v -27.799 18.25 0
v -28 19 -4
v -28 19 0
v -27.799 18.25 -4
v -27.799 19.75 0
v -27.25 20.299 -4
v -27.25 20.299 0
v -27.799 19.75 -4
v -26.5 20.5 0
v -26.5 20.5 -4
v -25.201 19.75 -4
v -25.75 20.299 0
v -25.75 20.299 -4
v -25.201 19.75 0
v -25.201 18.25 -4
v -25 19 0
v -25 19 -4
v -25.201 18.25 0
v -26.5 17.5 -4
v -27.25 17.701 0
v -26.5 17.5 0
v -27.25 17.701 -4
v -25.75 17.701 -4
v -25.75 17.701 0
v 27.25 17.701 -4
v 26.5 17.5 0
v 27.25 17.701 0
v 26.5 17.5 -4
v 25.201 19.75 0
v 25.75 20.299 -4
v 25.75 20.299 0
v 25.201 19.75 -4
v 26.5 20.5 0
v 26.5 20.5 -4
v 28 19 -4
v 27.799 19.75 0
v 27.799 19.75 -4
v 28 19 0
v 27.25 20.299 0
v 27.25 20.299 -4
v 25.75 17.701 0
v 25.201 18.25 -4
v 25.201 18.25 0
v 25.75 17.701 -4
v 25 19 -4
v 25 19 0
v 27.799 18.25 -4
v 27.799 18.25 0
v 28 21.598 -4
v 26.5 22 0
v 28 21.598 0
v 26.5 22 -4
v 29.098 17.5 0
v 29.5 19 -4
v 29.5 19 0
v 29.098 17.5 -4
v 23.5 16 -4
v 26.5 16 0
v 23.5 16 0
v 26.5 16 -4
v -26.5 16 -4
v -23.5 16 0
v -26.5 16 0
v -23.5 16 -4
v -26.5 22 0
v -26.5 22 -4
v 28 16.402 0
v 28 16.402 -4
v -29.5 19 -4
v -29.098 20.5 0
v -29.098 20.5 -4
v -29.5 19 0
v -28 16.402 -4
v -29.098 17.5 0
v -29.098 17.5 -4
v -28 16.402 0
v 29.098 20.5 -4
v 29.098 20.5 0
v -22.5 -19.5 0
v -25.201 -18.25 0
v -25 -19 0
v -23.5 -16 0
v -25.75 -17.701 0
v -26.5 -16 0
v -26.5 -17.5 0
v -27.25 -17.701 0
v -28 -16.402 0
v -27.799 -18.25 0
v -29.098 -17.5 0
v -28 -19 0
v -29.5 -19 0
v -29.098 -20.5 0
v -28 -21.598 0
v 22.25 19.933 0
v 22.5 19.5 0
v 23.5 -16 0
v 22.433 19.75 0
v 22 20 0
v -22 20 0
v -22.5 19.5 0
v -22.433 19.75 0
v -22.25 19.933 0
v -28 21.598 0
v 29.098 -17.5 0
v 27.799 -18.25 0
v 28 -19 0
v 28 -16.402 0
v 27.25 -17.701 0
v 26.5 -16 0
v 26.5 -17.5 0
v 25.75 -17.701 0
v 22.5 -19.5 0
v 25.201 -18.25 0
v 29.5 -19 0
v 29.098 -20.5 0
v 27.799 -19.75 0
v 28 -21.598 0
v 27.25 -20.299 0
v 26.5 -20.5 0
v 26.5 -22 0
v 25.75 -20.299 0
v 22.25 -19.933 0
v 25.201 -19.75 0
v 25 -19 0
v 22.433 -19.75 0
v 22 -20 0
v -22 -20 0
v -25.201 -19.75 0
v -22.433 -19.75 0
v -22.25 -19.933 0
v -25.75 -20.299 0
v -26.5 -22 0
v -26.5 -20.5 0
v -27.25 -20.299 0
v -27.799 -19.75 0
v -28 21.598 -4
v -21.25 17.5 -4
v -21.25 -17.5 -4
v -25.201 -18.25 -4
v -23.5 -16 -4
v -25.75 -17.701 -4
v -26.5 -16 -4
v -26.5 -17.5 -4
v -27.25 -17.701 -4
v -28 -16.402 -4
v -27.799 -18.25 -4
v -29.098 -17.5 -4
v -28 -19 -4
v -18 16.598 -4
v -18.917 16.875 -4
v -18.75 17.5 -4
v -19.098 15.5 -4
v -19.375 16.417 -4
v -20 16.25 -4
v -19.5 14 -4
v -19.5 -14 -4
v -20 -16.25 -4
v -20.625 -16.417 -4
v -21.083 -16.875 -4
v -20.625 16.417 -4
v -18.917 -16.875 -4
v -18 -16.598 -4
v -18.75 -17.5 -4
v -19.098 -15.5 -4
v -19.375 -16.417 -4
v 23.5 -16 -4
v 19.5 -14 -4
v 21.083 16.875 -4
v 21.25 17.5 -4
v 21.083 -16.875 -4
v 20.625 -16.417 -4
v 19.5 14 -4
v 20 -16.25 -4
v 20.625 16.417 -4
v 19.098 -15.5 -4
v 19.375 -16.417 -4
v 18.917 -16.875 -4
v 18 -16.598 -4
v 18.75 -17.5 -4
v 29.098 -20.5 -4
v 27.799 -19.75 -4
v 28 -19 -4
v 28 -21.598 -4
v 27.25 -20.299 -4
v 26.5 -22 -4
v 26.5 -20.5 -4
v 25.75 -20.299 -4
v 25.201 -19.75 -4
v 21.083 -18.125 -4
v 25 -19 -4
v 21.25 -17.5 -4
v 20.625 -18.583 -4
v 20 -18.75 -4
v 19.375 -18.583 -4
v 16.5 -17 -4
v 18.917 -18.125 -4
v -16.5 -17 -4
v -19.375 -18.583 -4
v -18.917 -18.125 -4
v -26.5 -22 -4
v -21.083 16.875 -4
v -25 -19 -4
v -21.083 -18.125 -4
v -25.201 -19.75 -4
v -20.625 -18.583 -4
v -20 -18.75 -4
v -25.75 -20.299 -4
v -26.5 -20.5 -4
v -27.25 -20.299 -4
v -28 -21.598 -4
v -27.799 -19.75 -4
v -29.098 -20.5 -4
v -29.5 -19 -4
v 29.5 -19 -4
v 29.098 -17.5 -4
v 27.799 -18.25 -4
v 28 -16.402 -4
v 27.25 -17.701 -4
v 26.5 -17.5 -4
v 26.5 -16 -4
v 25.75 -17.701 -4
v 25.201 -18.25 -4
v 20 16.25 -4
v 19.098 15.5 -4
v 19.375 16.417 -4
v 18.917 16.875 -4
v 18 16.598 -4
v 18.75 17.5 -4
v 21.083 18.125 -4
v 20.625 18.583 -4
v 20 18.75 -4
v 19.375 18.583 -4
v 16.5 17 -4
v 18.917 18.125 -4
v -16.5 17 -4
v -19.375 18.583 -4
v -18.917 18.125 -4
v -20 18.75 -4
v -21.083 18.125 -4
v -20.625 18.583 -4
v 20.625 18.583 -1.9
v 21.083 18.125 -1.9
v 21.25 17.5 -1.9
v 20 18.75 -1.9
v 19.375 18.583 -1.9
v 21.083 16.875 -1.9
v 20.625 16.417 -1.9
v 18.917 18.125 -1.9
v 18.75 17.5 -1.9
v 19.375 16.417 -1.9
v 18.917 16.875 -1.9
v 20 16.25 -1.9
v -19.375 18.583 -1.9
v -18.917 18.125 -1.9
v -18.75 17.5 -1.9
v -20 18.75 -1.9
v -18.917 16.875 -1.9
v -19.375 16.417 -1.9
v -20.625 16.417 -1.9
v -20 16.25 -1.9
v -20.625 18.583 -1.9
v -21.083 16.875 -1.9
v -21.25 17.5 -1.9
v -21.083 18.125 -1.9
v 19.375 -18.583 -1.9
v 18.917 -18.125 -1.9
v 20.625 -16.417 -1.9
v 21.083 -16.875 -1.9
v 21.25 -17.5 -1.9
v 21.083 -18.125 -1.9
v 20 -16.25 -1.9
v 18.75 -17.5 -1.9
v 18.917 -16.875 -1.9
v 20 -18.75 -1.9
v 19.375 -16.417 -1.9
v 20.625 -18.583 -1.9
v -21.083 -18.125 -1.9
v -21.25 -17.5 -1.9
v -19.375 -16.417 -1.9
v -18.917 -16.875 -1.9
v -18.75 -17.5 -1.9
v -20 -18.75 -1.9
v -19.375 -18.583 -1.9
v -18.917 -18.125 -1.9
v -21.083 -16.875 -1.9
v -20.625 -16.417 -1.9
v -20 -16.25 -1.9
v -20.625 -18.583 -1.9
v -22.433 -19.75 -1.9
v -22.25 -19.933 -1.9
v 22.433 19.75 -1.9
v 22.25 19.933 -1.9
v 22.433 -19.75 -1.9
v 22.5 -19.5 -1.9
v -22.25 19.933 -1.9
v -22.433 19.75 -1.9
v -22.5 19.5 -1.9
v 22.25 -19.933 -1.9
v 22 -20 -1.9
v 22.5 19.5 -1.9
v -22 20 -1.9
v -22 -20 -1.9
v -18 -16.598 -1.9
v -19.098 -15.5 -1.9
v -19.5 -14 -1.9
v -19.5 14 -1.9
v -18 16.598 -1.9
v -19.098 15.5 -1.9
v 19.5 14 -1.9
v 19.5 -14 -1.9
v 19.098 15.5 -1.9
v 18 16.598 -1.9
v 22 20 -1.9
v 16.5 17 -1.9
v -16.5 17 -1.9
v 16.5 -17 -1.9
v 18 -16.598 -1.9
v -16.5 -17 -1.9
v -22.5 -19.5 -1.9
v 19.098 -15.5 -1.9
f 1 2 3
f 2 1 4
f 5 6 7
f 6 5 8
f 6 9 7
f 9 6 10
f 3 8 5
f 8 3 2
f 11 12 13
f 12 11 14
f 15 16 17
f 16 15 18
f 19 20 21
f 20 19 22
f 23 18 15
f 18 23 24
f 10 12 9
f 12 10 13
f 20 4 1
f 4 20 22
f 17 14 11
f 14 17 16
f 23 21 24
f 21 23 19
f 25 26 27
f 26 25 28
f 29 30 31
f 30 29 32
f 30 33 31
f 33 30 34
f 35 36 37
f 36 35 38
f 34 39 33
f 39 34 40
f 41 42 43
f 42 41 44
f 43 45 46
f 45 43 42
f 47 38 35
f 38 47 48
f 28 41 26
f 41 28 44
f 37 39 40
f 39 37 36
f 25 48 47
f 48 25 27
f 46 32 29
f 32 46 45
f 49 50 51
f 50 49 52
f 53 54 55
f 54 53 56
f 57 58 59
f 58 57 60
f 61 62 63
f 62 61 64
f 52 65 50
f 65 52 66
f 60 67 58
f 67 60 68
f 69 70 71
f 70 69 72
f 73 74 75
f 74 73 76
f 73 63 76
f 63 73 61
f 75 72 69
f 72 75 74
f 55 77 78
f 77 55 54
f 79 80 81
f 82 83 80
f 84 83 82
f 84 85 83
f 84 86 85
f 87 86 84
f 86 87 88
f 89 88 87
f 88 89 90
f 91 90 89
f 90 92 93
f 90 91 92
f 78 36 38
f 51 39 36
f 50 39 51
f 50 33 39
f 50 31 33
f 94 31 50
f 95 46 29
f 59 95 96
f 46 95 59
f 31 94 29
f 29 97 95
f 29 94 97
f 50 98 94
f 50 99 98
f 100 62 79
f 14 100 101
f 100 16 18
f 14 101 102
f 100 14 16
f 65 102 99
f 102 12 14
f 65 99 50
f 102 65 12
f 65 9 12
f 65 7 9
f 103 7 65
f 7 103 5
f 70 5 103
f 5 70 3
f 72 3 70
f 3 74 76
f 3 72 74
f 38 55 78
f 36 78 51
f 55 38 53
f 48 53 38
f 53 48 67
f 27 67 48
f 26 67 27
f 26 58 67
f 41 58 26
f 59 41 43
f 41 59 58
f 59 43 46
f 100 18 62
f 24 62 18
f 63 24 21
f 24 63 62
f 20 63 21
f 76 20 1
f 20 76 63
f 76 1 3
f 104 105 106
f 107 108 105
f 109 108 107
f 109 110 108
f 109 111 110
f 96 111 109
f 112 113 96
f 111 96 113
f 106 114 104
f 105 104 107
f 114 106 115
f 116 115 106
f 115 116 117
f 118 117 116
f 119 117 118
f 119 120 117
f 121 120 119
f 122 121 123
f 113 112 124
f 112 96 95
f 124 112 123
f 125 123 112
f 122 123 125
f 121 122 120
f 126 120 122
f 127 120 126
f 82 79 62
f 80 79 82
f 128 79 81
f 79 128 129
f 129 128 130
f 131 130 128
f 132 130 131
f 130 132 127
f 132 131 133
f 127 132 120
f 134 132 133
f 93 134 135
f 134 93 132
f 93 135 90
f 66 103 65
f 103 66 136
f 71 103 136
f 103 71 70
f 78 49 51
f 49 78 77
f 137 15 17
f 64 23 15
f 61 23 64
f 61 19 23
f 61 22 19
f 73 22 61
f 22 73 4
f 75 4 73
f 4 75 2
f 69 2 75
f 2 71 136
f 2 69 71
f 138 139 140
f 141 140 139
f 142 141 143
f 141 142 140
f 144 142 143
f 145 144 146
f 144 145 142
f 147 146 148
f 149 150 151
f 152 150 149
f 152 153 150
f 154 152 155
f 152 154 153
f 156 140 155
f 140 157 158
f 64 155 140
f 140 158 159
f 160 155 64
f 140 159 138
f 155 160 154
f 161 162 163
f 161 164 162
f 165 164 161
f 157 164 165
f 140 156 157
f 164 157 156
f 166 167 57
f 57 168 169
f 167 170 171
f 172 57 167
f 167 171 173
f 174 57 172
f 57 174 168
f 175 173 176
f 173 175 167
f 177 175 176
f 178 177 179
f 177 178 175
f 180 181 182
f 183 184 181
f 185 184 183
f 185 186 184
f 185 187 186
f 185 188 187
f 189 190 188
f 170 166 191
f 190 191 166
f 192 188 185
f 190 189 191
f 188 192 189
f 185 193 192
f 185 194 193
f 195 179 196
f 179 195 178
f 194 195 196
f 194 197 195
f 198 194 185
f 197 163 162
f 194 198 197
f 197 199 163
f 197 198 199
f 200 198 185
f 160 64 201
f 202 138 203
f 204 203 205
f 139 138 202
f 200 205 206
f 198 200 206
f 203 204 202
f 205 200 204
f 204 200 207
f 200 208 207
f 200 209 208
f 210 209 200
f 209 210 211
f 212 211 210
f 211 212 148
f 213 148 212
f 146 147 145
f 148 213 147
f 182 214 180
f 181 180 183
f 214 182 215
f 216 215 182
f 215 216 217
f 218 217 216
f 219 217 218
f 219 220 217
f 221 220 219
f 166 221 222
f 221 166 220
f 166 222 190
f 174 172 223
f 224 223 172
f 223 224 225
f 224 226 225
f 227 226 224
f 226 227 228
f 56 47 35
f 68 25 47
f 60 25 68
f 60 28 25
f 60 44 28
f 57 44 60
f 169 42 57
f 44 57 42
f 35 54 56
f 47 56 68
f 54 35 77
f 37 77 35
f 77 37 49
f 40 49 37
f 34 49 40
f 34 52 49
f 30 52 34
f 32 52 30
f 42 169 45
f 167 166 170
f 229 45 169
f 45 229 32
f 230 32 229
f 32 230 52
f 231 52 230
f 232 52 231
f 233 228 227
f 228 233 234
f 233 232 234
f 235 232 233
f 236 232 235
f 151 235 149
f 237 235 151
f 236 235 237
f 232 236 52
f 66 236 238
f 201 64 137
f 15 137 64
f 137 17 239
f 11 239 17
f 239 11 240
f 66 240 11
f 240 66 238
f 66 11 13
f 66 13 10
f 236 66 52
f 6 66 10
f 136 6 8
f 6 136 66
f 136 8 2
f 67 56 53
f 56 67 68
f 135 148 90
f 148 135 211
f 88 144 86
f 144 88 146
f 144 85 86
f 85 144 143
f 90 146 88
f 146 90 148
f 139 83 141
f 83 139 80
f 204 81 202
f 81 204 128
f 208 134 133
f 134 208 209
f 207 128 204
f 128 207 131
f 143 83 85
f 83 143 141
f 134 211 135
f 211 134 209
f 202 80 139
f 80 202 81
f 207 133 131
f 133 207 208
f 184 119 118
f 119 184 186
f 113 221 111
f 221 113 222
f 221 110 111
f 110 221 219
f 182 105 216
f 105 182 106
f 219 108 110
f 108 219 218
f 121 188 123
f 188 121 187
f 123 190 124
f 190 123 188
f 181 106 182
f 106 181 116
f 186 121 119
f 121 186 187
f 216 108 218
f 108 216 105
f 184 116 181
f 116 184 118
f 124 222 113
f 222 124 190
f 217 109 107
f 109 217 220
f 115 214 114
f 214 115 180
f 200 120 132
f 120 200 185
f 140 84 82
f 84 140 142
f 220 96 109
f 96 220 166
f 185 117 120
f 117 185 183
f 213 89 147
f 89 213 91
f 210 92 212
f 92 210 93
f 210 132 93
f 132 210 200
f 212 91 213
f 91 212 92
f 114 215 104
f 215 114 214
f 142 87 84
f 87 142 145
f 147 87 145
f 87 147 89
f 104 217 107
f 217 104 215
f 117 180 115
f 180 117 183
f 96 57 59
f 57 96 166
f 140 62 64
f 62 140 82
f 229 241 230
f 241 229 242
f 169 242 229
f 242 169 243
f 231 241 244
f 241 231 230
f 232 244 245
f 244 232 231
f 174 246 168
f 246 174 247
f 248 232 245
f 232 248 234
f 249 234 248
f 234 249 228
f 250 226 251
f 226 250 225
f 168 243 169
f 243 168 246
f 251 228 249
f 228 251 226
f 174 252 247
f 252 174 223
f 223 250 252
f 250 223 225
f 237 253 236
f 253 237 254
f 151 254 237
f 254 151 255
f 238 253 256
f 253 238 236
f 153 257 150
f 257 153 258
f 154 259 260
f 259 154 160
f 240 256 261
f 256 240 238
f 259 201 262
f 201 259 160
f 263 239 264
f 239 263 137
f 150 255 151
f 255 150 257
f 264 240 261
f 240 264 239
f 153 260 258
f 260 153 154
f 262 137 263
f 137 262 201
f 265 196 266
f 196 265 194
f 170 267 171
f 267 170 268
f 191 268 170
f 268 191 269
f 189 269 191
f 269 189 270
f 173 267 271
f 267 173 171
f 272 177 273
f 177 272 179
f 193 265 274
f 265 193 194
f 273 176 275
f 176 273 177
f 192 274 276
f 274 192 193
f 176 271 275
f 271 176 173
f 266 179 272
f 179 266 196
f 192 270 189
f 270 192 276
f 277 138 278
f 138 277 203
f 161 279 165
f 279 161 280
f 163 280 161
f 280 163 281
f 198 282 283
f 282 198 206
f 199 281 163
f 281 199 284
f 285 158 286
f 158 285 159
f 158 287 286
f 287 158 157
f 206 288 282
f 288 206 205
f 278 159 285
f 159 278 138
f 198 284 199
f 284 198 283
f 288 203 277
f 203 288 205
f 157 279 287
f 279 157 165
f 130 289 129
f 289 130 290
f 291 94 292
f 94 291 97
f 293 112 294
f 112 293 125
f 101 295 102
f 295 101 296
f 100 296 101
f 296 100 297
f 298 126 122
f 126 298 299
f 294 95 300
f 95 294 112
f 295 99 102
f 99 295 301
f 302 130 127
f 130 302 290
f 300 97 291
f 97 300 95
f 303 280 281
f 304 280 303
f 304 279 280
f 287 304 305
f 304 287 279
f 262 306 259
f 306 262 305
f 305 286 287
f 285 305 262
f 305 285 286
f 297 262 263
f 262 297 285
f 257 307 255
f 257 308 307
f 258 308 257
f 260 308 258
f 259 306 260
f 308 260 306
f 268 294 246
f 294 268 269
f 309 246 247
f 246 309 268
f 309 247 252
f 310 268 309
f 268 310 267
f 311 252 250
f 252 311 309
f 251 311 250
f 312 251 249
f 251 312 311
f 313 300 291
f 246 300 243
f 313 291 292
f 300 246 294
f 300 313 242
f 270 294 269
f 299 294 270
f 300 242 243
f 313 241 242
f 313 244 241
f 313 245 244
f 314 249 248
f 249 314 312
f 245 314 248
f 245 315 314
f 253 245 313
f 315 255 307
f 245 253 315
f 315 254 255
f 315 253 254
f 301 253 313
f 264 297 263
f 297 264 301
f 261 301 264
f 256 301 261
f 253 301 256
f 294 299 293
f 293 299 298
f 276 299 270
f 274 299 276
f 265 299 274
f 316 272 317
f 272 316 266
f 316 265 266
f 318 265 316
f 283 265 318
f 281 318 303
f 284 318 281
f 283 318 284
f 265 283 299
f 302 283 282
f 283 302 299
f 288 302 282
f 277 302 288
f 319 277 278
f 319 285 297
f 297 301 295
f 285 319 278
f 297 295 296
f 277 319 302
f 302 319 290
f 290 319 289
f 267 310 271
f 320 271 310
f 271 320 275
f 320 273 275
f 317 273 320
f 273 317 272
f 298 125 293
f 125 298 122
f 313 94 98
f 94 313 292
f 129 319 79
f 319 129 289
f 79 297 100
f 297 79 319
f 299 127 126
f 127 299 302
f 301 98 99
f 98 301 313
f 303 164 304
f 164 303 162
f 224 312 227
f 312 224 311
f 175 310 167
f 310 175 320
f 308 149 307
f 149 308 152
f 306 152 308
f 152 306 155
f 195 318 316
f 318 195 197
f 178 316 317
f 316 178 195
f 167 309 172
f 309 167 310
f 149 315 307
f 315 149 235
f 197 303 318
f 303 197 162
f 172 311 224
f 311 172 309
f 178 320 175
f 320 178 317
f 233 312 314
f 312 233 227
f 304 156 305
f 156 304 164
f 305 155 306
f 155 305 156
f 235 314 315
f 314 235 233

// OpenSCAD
$fn=12;

boardDepth = 40;
boardWidth = 45;
boardHeigth = 10;

boardThickness = 2;

boardHoleDepth = boardDepth - 5;
boardHoleWidth = boardWidth - 5;
boardHolediamiter = 3;

baseDepth = boardDepth + 2;
baseWidth = boardWidth + 2;
baseHeigth = boardThickness + 2;

baseCornerDiameter = 4;

//% board();

translate([0,0,-baseHeigth/2])
	base();
//feet();


////////////////////////////////////////////////////////////////////////////////////////////////////
module board(){
	difference(){
		plate4Point(boardWidth,boardDepth,boardThickness,1);
		for(a=[[1,1],[-1,1],[1,-1],[-1,-1]]){
			translate([
				a[0] * boardHoleWidth/2,
				a[1] * boardHoleDepth/2,
				0
			])
				cylinder(h=5,center=true);
		}
	}
}
////////////////////////////////////////////////////////////////////////////////////////////////////
module base(){

	difference(){
		// 
		union(){
			plate4Point(baseWidth,baseDepth,baseHeigth,4);
			rotate([0,0,90]) 
				feet();
		}
		for(a=[[1,1],[-1,1],[1,-1],[-1,-1]]){
			translate([
				a[0] * boardHoleWidth/2,
				a[1] * boardHoleDepth/2,
				0
			])
				cylinder(h=5,d=boardHolediamiter-.5,center=true);
		}
		// Board cut out
		translate([0,0,baseHeigth-2.9]) plate4Point(boardWidth,boardDepth,boardThickness,1);
		// center cutout
		plate4Point(baseWidth-8,baseDepth-8,10,6);
	}

}
////////////////////////////////////////////////////////////////////////////////////////////////////
module feet(){
	
	lenAdd = 12;
	footLen = baseWidth + lenAdd;
	
 for(a=[1, -1]){
	translate([a*(baseDepth/2) - a*2, 0, 0]) 
		difference(){
			plate2Point(footLen, baseHeigth,6);
			for(b=[1,-1]){
				translate([0, b*(footLen/2) - b*3, 0])
					cylinder(h=5,d=boardHolediamiter,center=true);
			}
		}
	}
}
////////////////////////////////////////////////////////////////////////////////////////////////////
module plate4Point(x,y,z,d){
	hull(){
		color("green") translate([(x/2)-(d/2) ,(y/2) -(d/2),0]) cylinder(h=z, d=d, center=true);
		color("blue")  translate([(x/2)-(d/2) ,-(y/2)+(d/2),0]) cylinder(h=z, d=d, center=true);
		color("red")   translate([-(x/2)+(d/2),(y/2) -(d/2),0]) cylinder(h=z, d=d, center=true);
		color("grey")  translate([-(x/2)+(d/2),-(y/2)+(d/2),0]) cylinder(h=z, d=d, center=true);
	}
}
////////////////////////////////////////////////////////////////////////////////////////////////////
module plate2Point(y,z,d){
	hull(){
		color("green") translate([0 ,(y/2) -(d/2),0]) cylinder(h=z, d=d, center=true);
		color("blue")  translate([0 ,-(y/2)+(d/2),0]) cylinder(h=z, d=d, center=true);
	}
}
